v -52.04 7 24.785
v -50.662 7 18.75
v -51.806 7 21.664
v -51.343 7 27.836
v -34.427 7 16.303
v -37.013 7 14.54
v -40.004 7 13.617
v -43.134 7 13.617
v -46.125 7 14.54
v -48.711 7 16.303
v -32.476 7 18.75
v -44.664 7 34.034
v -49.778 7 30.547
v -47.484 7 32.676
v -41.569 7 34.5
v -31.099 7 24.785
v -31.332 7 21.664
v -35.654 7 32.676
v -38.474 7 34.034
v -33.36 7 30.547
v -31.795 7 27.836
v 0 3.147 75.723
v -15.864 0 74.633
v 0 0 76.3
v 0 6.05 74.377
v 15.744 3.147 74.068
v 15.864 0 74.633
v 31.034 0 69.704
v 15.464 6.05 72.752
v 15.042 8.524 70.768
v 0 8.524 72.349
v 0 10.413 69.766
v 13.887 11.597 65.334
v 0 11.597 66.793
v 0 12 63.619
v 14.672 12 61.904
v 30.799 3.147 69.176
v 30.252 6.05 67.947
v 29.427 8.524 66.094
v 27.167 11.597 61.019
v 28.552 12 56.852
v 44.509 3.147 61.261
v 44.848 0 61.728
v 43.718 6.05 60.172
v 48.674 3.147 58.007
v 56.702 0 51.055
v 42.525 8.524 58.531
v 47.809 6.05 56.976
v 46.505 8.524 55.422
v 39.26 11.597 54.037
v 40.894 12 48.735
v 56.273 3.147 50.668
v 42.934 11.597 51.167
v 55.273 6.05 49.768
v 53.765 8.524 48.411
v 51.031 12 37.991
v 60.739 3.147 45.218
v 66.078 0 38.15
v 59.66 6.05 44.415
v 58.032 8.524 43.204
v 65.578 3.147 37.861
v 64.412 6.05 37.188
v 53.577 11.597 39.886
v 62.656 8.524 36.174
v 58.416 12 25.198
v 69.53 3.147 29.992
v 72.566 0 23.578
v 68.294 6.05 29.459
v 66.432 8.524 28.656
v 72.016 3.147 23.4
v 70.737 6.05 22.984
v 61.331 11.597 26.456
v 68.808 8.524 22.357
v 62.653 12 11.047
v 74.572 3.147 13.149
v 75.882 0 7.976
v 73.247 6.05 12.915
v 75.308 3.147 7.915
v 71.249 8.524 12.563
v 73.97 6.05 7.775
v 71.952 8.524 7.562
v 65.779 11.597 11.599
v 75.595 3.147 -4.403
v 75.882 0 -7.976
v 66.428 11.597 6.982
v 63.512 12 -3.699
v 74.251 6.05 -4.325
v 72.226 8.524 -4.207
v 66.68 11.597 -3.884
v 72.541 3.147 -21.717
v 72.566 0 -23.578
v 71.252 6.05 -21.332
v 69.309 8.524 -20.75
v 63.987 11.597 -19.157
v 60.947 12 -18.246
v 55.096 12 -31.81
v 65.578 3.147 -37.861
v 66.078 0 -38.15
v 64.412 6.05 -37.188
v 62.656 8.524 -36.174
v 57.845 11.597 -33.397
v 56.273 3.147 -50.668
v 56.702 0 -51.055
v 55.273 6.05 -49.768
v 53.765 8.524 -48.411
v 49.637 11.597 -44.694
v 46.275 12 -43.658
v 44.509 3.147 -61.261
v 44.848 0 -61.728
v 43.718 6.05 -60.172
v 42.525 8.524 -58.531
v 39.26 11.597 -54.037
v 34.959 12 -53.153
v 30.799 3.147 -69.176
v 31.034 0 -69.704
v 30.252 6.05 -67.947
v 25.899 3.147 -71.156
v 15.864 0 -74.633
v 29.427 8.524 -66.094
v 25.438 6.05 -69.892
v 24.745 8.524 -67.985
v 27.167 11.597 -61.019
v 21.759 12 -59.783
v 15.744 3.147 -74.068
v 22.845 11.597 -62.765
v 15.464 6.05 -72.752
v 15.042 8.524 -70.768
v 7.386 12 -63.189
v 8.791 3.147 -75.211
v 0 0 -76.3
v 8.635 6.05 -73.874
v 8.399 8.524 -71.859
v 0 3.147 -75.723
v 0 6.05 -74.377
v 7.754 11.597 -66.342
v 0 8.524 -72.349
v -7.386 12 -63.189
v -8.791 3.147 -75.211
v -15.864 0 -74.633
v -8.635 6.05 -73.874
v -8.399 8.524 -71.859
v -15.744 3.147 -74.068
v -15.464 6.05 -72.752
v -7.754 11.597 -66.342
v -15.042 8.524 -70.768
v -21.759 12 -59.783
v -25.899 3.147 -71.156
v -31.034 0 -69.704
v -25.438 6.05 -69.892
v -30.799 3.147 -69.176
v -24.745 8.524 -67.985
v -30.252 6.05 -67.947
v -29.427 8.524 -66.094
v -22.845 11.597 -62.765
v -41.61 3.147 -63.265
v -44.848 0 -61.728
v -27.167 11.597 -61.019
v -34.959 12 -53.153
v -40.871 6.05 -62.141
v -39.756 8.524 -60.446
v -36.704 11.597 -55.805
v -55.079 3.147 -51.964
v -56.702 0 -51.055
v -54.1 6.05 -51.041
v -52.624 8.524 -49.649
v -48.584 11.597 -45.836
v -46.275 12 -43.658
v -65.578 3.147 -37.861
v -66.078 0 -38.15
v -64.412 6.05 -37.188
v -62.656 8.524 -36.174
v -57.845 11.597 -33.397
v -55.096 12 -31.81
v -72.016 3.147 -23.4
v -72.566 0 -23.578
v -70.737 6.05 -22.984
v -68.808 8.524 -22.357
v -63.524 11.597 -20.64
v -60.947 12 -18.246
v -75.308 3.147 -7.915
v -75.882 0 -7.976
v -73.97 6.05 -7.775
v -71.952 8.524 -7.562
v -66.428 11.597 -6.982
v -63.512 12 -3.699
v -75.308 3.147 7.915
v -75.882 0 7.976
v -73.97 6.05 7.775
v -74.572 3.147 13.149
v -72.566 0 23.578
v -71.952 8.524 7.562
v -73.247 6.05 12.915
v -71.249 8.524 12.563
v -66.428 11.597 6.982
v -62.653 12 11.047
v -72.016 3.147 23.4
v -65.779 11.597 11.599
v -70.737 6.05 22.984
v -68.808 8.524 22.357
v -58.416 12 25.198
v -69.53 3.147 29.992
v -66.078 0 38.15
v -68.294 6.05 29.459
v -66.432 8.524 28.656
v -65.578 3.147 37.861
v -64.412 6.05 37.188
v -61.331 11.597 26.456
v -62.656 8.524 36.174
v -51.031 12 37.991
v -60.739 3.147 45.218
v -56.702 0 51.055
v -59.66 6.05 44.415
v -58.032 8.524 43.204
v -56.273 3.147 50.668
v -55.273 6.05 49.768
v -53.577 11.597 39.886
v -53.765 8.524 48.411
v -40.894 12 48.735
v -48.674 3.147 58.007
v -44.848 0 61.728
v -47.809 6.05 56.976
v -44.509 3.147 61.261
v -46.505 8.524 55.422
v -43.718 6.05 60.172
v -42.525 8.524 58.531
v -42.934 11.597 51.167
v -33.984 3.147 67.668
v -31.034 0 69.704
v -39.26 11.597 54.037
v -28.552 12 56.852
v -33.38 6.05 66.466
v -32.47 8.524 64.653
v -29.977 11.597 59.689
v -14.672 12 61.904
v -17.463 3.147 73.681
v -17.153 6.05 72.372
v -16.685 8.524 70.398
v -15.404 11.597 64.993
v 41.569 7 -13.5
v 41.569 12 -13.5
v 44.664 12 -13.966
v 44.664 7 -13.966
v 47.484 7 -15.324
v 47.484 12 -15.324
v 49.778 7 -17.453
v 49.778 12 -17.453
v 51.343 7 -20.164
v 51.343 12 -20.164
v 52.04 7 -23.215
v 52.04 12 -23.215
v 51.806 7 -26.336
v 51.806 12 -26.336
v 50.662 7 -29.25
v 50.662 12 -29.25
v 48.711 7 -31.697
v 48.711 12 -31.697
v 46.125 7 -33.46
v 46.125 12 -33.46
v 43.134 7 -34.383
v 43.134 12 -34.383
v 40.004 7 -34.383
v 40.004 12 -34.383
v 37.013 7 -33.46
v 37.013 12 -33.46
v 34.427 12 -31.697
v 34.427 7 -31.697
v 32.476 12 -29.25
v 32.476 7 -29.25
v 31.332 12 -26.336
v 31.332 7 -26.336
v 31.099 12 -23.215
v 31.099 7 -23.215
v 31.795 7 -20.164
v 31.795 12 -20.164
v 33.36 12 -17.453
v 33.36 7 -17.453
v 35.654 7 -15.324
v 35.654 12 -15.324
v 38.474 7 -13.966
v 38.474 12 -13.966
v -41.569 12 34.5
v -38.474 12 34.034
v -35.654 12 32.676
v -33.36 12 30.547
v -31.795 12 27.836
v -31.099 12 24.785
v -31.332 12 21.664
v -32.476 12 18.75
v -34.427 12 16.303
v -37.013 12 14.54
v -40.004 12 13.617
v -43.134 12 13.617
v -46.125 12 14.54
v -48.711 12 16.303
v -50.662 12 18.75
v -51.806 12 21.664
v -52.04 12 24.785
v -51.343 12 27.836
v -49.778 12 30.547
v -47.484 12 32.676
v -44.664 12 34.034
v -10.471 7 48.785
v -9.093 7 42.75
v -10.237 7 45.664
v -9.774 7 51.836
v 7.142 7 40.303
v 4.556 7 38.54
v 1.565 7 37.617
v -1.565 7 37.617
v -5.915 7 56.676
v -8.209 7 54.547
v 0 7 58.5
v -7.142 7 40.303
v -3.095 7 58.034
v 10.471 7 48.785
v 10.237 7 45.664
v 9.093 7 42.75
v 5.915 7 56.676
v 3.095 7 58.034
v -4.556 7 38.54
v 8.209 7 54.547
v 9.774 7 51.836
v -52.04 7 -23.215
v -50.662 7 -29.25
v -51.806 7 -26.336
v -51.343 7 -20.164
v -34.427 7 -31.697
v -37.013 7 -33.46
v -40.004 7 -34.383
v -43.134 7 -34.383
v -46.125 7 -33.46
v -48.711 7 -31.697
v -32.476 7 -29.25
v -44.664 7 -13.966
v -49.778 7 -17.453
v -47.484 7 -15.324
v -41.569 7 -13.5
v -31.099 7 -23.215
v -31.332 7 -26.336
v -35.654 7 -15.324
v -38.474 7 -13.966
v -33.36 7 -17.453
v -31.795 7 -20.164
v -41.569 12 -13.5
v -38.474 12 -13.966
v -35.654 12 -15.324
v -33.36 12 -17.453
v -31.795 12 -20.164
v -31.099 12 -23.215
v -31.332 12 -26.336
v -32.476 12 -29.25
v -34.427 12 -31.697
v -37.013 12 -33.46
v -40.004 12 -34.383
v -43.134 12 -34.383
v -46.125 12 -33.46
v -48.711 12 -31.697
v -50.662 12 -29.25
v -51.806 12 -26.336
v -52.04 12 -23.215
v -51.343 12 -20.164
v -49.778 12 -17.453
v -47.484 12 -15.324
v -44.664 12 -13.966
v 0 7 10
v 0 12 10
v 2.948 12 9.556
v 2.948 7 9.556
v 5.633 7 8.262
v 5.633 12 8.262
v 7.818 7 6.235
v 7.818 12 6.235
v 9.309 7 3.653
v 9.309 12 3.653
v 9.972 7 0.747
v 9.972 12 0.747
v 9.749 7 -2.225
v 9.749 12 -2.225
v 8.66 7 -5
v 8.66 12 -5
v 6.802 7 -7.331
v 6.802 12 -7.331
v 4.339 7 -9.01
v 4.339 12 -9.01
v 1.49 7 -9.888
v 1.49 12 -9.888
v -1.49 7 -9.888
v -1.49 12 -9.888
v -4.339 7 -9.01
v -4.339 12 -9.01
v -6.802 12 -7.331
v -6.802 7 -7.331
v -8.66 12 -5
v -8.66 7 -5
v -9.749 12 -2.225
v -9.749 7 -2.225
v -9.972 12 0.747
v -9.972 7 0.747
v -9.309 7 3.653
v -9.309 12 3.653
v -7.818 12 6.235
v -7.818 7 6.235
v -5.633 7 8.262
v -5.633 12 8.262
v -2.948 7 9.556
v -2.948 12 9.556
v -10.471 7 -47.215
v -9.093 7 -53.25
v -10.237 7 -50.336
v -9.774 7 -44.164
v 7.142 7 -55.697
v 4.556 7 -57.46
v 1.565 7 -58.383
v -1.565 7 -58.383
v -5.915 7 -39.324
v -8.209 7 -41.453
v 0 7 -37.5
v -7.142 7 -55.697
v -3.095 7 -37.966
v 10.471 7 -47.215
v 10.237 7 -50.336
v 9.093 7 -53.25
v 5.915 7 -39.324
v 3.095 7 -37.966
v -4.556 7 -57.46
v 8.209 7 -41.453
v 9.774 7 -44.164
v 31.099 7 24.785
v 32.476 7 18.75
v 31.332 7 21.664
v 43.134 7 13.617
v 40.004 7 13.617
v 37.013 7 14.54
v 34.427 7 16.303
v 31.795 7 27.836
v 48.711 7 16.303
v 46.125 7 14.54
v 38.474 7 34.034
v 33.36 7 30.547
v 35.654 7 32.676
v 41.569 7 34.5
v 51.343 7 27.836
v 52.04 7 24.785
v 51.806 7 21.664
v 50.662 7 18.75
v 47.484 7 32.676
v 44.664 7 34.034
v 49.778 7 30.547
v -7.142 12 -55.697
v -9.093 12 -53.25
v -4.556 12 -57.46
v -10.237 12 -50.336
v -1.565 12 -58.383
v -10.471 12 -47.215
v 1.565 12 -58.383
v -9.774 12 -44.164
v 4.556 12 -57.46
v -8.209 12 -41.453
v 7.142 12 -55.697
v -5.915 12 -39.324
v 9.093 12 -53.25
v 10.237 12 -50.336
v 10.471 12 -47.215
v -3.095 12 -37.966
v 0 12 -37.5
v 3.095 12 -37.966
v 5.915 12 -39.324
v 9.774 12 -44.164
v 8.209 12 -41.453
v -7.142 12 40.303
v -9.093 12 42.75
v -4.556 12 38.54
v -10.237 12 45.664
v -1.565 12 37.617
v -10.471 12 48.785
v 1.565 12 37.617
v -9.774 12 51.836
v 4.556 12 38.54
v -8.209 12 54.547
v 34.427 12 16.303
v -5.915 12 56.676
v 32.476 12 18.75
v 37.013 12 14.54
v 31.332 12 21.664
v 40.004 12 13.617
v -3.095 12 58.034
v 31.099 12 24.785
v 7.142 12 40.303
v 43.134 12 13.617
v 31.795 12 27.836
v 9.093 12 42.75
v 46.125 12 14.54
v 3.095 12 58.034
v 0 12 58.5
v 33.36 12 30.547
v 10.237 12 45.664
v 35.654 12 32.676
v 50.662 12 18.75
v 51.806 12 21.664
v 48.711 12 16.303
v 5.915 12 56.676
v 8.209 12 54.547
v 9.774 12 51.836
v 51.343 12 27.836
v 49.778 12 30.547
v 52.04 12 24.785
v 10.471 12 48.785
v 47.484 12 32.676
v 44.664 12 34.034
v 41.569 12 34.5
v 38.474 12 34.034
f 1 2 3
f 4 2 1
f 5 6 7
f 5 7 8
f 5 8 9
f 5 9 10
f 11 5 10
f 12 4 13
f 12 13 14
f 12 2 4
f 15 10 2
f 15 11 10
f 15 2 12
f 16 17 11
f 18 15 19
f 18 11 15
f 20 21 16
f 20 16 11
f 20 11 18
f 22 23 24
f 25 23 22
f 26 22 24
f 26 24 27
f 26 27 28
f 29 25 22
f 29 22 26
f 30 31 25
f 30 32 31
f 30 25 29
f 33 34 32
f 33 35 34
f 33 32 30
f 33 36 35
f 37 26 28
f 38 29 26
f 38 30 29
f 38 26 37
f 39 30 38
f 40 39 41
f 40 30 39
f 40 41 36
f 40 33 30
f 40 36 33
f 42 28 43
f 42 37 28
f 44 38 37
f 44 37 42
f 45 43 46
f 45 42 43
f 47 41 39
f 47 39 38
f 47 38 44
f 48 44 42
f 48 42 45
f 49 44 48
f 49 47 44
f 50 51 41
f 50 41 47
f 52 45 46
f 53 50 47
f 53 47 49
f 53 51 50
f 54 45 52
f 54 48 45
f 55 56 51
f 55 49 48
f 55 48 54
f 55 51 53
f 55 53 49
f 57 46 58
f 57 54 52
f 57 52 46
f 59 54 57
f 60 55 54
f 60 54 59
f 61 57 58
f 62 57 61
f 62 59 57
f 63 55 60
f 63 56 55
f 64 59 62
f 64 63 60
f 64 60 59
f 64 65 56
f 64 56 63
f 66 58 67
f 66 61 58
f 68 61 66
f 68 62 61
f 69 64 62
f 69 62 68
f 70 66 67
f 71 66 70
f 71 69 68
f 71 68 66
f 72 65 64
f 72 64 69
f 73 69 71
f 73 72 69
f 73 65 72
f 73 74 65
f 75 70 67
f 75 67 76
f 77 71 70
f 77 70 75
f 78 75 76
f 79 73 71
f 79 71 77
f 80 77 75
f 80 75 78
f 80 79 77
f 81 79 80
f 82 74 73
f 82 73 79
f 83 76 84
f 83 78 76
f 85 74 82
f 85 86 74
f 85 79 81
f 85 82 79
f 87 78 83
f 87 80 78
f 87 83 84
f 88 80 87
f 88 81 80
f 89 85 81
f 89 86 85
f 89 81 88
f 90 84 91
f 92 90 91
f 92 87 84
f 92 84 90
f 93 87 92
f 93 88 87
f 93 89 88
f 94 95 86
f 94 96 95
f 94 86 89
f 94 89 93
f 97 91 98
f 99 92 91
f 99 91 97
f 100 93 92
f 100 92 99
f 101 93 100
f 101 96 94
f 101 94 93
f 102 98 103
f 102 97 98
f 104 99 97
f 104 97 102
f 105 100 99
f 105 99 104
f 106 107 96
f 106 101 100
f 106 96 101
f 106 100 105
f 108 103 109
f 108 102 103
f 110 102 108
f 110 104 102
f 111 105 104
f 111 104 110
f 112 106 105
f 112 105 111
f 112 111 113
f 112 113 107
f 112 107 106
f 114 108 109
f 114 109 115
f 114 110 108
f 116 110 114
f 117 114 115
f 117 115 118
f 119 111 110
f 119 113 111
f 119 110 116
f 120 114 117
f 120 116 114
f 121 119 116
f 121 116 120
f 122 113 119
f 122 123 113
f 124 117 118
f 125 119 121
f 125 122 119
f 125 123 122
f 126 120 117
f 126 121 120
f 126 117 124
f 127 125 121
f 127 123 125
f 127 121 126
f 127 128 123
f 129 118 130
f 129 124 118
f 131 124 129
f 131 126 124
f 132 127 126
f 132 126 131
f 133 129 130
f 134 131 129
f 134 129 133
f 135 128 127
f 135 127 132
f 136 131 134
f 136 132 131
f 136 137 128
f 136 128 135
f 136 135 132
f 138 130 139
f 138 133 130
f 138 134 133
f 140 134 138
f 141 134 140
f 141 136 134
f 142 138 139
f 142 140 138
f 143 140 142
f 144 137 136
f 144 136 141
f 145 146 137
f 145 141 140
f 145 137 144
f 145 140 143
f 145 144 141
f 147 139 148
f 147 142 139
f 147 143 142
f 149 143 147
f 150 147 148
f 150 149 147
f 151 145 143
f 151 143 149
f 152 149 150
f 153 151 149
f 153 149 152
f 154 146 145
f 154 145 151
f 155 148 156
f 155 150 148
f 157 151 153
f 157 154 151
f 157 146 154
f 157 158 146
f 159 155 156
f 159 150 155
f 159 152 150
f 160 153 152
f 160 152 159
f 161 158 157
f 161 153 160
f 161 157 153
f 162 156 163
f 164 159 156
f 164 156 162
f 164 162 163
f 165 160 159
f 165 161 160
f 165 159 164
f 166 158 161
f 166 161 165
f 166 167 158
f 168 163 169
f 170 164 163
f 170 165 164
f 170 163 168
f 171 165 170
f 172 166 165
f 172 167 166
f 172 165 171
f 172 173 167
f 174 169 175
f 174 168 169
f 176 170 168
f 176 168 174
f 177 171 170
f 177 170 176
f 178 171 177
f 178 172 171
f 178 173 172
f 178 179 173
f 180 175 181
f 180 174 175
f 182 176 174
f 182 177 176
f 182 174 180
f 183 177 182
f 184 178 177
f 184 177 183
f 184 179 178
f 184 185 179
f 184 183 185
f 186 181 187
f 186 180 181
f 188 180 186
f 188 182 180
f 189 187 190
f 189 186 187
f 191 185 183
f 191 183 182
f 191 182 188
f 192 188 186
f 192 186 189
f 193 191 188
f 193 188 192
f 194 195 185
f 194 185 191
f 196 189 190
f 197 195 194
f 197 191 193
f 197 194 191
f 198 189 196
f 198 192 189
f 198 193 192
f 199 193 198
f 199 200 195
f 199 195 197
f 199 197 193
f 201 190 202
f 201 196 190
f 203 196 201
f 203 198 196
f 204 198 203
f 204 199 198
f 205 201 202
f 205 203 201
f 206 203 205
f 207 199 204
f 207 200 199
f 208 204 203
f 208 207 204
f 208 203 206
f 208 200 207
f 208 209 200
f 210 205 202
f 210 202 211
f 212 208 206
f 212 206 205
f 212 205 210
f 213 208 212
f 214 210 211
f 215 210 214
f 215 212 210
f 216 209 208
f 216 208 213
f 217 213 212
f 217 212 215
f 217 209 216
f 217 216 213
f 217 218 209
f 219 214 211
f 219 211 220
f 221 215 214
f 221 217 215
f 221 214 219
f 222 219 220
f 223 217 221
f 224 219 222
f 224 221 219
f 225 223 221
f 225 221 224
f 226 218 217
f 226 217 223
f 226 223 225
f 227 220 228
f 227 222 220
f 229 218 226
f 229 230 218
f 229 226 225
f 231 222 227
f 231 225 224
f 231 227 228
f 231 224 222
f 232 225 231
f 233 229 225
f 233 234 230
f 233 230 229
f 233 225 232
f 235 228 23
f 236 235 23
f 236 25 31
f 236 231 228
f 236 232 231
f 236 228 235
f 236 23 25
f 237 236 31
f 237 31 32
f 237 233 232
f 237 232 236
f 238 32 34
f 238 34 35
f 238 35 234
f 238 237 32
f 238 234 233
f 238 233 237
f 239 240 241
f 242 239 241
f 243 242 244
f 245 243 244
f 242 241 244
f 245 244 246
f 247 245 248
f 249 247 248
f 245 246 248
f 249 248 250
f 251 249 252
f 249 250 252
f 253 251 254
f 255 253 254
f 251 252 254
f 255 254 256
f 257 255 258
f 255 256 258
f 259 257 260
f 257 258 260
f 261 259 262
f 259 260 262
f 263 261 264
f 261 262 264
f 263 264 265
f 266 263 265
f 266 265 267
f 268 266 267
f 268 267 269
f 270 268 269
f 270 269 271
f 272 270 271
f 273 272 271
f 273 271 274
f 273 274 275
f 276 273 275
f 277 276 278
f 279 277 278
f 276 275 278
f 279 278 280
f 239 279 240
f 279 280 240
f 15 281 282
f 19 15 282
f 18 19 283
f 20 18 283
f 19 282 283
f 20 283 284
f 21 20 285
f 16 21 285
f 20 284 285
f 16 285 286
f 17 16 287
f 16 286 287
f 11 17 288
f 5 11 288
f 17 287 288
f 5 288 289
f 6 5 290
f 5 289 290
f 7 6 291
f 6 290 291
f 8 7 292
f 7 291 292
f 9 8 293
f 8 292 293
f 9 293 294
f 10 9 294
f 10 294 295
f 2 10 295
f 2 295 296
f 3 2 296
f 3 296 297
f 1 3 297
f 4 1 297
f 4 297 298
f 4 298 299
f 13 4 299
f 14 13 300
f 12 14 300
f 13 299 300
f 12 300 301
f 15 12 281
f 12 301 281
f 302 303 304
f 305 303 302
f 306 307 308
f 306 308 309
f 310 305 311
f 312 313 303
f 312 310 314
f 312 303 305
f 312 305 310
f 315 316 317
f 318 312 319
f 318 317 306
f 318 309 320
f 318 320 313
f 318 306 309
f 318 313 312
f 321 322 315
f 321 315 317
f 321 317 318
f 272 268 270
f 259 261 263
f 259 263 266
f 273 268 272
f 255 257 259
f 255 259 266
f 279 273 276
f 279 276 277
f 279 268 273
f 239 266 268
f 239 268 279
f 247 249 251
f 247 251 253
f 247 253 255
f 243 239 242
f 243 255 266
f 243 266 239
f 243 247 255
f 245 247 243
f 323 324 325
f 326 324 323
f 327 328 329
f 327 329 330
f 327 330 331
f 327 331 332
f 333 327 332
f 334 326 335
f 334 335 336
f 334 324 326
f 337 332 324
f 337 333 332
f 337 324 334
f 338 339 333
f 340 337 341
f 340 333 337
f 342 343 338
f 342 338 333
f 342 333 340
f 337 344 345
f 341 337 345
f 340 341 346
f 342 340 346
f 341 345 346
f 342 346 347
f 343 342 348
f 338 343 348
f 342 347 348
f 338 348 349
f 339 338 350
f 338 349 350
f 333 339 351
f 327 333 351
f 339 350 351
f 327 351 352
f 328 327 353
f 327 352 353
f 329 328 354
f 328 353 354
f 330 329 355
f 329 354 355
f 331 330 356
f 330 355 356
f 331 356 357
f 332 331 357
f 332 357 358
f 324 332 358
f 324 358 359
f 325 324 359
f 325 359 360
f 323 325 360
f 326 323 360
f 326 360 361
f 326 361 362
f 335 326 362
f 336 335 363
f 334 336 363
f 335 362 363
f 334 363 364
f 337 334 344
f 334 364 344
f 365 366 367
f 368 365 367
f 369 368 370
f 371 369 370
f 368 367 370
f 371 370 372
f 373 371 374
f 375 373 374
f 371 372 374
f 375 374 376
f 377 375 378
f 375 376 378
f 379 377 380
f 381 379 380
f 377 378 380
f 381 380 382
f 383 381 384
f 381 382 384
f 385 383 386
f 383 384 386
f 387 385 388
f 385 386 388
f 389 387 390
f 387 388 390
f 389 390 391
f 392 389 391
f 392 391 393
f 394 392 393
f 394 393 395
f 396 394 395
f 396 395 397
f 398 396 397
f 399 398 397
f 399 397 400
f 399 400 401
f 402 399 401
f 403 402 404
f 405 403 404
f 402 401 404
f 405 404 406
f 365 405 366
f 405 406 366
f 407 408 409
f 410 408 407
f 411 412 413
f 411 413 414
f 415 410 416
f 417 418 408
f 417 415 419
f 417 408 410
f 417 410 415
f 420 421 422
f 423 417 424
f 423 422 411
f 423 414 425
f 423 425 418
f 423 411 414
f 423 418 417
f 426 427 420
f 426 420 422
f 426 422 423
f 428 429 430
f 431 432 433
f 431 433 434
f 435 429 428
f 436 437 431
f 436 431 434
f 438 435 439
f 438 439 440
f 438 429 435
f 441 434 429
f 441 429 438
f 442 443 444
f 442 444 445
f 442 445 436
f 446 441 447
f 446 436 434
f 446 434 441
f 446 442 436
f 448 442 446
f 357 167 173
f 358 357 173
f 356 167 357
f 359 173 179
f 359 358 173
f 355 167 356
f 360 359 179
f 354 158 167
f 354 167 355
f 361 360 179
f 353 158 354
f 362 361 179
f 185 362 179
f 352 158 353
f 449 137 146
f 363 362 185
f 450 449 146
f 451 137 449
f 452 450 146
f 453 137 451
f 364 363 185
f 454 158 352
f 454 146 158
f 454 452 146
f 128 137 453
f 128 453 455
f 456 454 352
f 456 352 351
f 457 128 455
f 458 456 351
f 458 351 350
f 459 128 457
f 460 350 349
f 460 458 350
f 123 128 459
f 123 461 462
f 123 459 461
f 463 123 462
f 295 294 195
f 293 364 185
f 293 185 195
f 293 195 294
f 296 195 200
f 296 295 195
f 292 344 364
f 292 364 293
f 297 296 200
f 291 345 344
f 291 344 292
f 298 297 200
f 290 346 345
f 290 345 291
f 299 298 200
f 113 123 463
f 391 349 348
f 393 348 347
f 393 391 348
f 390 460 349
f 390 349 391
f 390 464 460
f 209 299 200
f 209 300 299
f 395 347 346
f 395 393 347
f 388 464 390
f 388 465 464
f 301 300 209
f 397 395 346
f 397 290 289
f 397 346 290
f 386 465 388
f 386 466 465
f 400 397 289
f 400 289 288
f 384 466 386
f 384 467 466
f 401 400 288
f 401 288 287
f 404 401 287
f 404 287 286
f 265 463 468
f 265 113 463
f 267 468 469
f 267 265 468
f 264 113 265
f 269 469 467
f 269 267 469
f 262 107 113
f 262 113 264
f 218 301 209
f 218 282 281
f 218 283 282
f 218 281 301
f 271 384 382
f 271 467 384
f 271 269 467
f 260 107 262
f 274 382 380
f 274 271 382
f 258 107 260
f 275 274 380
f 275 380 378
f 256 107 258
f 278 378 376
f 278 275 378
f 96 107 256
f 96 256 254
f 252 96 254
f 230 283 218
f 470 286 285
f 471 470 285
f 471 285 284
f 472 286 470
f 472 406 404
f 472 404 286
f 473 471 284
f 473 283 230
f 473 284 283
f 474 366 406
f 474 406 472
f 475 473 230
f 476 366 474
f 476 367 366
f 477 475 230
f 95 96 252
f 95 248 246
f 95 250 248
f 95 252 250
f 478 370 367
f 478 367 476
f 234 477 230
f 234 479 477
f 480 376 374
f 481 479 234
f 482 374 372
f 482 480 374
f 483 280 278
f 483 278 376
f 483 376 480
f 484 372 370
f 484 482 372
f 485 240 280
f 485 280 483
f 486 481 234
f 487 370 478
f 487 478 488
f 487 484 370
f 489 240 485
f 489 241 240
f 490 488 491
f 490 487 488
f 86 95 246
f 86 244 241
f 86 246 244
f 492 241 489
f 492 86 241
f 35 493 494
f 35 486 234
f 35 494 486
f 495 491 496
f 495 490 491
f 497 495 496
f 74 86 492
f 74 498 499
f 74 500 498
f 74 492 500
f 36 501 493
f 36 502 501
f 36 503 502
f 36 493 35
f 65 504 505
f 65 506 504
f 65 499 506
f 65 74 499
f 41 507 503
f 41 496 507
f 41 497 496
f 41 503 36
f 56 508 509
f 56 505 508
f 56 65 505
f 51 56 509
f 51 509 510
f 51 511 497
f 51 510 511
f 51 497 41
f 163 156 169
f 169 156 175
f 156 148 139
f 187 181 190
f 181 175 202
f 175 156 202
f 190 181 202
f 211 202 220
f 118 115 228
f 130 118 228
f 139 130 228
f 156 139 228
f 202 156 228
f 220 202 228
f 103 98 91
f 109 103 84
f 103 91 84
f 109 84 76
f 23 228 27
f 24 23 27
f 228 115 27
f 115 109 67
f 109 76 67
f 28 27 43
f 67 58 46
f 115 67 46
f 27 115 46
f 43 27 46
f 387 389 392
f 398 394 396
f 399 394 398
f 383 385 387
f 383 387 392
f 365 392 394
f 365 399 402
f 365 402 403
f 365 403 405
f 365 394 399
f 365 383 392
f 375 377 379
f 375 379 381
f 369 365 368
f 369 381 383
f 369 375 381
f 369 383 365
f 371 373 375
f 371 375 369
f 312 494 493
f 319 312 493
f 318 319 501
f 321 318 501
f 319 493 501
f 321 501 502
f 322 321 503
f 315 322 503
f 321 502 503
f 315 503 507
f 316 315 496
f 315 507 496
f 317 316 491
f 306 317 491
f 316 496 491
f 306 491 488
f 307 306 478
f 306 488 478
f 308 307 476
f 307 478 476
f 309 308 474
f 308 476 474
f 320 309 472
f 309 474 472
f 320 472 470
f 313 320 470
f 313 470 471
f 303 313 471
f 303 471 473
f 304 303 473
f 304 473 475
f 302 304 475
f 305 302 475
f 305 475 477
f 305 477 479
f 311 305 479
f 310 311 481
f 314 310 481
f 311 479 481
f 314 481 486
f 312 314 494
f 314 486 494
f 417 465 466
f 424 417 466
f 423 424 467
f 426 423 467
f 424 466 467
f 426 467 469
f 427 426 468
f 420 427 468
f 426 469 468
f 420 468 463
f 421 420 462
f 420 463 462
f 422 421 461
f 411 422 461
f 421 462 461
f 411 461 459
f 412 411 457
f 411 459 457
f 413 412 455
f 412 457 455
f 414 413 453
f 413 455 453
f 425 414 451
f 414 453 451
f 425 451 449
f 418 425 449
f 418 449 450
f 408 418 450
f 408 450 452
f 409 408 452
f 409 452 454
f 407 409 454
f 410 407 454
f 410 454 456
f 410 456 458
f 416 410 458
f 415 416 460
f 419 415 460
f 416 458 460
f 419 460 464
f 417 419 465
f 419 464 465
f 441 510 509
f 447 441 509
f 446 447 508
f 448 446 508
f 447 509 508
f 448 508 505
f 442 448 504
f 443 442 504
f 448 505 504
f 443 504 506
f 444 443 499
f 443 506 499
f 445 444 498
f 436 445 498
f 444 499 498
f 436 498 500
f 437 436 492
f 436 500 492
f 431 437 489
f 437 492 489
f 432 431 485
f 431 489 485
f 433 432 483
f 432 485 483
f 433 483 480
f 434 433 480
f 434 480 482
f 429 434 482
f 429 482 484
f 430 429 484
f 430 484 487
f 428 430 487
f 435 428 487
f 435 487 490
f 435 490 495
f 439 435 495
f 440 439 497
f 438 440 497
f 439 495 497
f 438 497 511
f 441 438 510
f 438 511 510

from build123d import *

# Parameters (mm, degrees)
ESQUISSE1_R             = 76.3
BOSS_EXTRU_1_DEPTH      = 12
CONG_1_R                = 12.7
ESQUISSE2_R             = 10
ESQUISSE2_R_2           = 10.5
ENL_V_MAT_EXTRU_1_DEPTH = 5


with BuildPart() as part:
    # Esquisse1 → Boss.-Extru.1 (new body)
    with BuildSketch(Plane(origin=(0, 0, 0), x_dir=(1, 0, 0), z_dir=(0, 1, 0))):
        with Locations(Location((0, 0, 0), (0, 0, 270))):
            Circle(ESQUISSE1_R)
    extrude(amount=BOSS_EXTRU_1_DEPTH)

    # Congé1
    # the kernel refuses this fillet: 12.7 mm, written as the material it takes off along each edge
    with BuildSketch(Plane(origin=(0, 12, 0), x_dir=(0, 0, 1), z_dir=(-1, 0, 0))) as cong_1_piece_1:
        with BuildLine():
            CenterArc((63.619306013, -12.7), CONG_1_R, 3.159636303, 86.840363697)
            Line((63.619306013, 0), (63.619306013, 0.254))
            Line((63.619306013, 0.254), (76.3, 0.254))
            Line((76.3, 0.254), (76.554, 0))
            ThreePointArc((76.554, 0), (76.554, -6), (76.55361388, -11.986))
            Line((76.55361388, -11.986), (76.3, -12))
        make_face()
    revolve(axis=Axis((0, 12, 0), (0, 1, 0)), mode=Mode.SUBTRACT)

    # Esquisse2 → Enlèv. mat.-Extru.1 (cut)
    with BuildSketch(Plane(origin=(0, 12, 0), x_dir=(1, 0, 0), z_dir=(0, 1, 0))):
        with Locations(Location((0, 0, 0), (0, 0, 270))):
            Circle(ESQUISSE2_R)
        with Locations(Location((0, 48, 0), (0, 0, 270))):
            Circle(ESQUISSE2_R_2)
        with Locations(Location((41.569219382, 24, 0), (0, 0, 270))):
            Circle(ESQUISSE2_R_2)
        with Locations(Location((41.569219382, -24, 0), (0, 0, 270))):
            Circle(ESQUISSE2_R_2)
        with Locations(Location((0, -48, 0), (0, 0, 270))):
            Circle(ESQUISSE2_R_2)
        with Locations(Location((-41.569219382, -24, 0), (0, 0, 270))):
            Circle(ESQUISSE2_R_2)
        with Locations(Location((-41.569219382, 24, 0), (0, 0, 270))):
            Circle(ESQUISSE2_R_2)
    extrude(amount=-ENL_V_MAT_EXTRU_1_DEPTH, mode=Mode.SUBTRACT)


solid = part.part
